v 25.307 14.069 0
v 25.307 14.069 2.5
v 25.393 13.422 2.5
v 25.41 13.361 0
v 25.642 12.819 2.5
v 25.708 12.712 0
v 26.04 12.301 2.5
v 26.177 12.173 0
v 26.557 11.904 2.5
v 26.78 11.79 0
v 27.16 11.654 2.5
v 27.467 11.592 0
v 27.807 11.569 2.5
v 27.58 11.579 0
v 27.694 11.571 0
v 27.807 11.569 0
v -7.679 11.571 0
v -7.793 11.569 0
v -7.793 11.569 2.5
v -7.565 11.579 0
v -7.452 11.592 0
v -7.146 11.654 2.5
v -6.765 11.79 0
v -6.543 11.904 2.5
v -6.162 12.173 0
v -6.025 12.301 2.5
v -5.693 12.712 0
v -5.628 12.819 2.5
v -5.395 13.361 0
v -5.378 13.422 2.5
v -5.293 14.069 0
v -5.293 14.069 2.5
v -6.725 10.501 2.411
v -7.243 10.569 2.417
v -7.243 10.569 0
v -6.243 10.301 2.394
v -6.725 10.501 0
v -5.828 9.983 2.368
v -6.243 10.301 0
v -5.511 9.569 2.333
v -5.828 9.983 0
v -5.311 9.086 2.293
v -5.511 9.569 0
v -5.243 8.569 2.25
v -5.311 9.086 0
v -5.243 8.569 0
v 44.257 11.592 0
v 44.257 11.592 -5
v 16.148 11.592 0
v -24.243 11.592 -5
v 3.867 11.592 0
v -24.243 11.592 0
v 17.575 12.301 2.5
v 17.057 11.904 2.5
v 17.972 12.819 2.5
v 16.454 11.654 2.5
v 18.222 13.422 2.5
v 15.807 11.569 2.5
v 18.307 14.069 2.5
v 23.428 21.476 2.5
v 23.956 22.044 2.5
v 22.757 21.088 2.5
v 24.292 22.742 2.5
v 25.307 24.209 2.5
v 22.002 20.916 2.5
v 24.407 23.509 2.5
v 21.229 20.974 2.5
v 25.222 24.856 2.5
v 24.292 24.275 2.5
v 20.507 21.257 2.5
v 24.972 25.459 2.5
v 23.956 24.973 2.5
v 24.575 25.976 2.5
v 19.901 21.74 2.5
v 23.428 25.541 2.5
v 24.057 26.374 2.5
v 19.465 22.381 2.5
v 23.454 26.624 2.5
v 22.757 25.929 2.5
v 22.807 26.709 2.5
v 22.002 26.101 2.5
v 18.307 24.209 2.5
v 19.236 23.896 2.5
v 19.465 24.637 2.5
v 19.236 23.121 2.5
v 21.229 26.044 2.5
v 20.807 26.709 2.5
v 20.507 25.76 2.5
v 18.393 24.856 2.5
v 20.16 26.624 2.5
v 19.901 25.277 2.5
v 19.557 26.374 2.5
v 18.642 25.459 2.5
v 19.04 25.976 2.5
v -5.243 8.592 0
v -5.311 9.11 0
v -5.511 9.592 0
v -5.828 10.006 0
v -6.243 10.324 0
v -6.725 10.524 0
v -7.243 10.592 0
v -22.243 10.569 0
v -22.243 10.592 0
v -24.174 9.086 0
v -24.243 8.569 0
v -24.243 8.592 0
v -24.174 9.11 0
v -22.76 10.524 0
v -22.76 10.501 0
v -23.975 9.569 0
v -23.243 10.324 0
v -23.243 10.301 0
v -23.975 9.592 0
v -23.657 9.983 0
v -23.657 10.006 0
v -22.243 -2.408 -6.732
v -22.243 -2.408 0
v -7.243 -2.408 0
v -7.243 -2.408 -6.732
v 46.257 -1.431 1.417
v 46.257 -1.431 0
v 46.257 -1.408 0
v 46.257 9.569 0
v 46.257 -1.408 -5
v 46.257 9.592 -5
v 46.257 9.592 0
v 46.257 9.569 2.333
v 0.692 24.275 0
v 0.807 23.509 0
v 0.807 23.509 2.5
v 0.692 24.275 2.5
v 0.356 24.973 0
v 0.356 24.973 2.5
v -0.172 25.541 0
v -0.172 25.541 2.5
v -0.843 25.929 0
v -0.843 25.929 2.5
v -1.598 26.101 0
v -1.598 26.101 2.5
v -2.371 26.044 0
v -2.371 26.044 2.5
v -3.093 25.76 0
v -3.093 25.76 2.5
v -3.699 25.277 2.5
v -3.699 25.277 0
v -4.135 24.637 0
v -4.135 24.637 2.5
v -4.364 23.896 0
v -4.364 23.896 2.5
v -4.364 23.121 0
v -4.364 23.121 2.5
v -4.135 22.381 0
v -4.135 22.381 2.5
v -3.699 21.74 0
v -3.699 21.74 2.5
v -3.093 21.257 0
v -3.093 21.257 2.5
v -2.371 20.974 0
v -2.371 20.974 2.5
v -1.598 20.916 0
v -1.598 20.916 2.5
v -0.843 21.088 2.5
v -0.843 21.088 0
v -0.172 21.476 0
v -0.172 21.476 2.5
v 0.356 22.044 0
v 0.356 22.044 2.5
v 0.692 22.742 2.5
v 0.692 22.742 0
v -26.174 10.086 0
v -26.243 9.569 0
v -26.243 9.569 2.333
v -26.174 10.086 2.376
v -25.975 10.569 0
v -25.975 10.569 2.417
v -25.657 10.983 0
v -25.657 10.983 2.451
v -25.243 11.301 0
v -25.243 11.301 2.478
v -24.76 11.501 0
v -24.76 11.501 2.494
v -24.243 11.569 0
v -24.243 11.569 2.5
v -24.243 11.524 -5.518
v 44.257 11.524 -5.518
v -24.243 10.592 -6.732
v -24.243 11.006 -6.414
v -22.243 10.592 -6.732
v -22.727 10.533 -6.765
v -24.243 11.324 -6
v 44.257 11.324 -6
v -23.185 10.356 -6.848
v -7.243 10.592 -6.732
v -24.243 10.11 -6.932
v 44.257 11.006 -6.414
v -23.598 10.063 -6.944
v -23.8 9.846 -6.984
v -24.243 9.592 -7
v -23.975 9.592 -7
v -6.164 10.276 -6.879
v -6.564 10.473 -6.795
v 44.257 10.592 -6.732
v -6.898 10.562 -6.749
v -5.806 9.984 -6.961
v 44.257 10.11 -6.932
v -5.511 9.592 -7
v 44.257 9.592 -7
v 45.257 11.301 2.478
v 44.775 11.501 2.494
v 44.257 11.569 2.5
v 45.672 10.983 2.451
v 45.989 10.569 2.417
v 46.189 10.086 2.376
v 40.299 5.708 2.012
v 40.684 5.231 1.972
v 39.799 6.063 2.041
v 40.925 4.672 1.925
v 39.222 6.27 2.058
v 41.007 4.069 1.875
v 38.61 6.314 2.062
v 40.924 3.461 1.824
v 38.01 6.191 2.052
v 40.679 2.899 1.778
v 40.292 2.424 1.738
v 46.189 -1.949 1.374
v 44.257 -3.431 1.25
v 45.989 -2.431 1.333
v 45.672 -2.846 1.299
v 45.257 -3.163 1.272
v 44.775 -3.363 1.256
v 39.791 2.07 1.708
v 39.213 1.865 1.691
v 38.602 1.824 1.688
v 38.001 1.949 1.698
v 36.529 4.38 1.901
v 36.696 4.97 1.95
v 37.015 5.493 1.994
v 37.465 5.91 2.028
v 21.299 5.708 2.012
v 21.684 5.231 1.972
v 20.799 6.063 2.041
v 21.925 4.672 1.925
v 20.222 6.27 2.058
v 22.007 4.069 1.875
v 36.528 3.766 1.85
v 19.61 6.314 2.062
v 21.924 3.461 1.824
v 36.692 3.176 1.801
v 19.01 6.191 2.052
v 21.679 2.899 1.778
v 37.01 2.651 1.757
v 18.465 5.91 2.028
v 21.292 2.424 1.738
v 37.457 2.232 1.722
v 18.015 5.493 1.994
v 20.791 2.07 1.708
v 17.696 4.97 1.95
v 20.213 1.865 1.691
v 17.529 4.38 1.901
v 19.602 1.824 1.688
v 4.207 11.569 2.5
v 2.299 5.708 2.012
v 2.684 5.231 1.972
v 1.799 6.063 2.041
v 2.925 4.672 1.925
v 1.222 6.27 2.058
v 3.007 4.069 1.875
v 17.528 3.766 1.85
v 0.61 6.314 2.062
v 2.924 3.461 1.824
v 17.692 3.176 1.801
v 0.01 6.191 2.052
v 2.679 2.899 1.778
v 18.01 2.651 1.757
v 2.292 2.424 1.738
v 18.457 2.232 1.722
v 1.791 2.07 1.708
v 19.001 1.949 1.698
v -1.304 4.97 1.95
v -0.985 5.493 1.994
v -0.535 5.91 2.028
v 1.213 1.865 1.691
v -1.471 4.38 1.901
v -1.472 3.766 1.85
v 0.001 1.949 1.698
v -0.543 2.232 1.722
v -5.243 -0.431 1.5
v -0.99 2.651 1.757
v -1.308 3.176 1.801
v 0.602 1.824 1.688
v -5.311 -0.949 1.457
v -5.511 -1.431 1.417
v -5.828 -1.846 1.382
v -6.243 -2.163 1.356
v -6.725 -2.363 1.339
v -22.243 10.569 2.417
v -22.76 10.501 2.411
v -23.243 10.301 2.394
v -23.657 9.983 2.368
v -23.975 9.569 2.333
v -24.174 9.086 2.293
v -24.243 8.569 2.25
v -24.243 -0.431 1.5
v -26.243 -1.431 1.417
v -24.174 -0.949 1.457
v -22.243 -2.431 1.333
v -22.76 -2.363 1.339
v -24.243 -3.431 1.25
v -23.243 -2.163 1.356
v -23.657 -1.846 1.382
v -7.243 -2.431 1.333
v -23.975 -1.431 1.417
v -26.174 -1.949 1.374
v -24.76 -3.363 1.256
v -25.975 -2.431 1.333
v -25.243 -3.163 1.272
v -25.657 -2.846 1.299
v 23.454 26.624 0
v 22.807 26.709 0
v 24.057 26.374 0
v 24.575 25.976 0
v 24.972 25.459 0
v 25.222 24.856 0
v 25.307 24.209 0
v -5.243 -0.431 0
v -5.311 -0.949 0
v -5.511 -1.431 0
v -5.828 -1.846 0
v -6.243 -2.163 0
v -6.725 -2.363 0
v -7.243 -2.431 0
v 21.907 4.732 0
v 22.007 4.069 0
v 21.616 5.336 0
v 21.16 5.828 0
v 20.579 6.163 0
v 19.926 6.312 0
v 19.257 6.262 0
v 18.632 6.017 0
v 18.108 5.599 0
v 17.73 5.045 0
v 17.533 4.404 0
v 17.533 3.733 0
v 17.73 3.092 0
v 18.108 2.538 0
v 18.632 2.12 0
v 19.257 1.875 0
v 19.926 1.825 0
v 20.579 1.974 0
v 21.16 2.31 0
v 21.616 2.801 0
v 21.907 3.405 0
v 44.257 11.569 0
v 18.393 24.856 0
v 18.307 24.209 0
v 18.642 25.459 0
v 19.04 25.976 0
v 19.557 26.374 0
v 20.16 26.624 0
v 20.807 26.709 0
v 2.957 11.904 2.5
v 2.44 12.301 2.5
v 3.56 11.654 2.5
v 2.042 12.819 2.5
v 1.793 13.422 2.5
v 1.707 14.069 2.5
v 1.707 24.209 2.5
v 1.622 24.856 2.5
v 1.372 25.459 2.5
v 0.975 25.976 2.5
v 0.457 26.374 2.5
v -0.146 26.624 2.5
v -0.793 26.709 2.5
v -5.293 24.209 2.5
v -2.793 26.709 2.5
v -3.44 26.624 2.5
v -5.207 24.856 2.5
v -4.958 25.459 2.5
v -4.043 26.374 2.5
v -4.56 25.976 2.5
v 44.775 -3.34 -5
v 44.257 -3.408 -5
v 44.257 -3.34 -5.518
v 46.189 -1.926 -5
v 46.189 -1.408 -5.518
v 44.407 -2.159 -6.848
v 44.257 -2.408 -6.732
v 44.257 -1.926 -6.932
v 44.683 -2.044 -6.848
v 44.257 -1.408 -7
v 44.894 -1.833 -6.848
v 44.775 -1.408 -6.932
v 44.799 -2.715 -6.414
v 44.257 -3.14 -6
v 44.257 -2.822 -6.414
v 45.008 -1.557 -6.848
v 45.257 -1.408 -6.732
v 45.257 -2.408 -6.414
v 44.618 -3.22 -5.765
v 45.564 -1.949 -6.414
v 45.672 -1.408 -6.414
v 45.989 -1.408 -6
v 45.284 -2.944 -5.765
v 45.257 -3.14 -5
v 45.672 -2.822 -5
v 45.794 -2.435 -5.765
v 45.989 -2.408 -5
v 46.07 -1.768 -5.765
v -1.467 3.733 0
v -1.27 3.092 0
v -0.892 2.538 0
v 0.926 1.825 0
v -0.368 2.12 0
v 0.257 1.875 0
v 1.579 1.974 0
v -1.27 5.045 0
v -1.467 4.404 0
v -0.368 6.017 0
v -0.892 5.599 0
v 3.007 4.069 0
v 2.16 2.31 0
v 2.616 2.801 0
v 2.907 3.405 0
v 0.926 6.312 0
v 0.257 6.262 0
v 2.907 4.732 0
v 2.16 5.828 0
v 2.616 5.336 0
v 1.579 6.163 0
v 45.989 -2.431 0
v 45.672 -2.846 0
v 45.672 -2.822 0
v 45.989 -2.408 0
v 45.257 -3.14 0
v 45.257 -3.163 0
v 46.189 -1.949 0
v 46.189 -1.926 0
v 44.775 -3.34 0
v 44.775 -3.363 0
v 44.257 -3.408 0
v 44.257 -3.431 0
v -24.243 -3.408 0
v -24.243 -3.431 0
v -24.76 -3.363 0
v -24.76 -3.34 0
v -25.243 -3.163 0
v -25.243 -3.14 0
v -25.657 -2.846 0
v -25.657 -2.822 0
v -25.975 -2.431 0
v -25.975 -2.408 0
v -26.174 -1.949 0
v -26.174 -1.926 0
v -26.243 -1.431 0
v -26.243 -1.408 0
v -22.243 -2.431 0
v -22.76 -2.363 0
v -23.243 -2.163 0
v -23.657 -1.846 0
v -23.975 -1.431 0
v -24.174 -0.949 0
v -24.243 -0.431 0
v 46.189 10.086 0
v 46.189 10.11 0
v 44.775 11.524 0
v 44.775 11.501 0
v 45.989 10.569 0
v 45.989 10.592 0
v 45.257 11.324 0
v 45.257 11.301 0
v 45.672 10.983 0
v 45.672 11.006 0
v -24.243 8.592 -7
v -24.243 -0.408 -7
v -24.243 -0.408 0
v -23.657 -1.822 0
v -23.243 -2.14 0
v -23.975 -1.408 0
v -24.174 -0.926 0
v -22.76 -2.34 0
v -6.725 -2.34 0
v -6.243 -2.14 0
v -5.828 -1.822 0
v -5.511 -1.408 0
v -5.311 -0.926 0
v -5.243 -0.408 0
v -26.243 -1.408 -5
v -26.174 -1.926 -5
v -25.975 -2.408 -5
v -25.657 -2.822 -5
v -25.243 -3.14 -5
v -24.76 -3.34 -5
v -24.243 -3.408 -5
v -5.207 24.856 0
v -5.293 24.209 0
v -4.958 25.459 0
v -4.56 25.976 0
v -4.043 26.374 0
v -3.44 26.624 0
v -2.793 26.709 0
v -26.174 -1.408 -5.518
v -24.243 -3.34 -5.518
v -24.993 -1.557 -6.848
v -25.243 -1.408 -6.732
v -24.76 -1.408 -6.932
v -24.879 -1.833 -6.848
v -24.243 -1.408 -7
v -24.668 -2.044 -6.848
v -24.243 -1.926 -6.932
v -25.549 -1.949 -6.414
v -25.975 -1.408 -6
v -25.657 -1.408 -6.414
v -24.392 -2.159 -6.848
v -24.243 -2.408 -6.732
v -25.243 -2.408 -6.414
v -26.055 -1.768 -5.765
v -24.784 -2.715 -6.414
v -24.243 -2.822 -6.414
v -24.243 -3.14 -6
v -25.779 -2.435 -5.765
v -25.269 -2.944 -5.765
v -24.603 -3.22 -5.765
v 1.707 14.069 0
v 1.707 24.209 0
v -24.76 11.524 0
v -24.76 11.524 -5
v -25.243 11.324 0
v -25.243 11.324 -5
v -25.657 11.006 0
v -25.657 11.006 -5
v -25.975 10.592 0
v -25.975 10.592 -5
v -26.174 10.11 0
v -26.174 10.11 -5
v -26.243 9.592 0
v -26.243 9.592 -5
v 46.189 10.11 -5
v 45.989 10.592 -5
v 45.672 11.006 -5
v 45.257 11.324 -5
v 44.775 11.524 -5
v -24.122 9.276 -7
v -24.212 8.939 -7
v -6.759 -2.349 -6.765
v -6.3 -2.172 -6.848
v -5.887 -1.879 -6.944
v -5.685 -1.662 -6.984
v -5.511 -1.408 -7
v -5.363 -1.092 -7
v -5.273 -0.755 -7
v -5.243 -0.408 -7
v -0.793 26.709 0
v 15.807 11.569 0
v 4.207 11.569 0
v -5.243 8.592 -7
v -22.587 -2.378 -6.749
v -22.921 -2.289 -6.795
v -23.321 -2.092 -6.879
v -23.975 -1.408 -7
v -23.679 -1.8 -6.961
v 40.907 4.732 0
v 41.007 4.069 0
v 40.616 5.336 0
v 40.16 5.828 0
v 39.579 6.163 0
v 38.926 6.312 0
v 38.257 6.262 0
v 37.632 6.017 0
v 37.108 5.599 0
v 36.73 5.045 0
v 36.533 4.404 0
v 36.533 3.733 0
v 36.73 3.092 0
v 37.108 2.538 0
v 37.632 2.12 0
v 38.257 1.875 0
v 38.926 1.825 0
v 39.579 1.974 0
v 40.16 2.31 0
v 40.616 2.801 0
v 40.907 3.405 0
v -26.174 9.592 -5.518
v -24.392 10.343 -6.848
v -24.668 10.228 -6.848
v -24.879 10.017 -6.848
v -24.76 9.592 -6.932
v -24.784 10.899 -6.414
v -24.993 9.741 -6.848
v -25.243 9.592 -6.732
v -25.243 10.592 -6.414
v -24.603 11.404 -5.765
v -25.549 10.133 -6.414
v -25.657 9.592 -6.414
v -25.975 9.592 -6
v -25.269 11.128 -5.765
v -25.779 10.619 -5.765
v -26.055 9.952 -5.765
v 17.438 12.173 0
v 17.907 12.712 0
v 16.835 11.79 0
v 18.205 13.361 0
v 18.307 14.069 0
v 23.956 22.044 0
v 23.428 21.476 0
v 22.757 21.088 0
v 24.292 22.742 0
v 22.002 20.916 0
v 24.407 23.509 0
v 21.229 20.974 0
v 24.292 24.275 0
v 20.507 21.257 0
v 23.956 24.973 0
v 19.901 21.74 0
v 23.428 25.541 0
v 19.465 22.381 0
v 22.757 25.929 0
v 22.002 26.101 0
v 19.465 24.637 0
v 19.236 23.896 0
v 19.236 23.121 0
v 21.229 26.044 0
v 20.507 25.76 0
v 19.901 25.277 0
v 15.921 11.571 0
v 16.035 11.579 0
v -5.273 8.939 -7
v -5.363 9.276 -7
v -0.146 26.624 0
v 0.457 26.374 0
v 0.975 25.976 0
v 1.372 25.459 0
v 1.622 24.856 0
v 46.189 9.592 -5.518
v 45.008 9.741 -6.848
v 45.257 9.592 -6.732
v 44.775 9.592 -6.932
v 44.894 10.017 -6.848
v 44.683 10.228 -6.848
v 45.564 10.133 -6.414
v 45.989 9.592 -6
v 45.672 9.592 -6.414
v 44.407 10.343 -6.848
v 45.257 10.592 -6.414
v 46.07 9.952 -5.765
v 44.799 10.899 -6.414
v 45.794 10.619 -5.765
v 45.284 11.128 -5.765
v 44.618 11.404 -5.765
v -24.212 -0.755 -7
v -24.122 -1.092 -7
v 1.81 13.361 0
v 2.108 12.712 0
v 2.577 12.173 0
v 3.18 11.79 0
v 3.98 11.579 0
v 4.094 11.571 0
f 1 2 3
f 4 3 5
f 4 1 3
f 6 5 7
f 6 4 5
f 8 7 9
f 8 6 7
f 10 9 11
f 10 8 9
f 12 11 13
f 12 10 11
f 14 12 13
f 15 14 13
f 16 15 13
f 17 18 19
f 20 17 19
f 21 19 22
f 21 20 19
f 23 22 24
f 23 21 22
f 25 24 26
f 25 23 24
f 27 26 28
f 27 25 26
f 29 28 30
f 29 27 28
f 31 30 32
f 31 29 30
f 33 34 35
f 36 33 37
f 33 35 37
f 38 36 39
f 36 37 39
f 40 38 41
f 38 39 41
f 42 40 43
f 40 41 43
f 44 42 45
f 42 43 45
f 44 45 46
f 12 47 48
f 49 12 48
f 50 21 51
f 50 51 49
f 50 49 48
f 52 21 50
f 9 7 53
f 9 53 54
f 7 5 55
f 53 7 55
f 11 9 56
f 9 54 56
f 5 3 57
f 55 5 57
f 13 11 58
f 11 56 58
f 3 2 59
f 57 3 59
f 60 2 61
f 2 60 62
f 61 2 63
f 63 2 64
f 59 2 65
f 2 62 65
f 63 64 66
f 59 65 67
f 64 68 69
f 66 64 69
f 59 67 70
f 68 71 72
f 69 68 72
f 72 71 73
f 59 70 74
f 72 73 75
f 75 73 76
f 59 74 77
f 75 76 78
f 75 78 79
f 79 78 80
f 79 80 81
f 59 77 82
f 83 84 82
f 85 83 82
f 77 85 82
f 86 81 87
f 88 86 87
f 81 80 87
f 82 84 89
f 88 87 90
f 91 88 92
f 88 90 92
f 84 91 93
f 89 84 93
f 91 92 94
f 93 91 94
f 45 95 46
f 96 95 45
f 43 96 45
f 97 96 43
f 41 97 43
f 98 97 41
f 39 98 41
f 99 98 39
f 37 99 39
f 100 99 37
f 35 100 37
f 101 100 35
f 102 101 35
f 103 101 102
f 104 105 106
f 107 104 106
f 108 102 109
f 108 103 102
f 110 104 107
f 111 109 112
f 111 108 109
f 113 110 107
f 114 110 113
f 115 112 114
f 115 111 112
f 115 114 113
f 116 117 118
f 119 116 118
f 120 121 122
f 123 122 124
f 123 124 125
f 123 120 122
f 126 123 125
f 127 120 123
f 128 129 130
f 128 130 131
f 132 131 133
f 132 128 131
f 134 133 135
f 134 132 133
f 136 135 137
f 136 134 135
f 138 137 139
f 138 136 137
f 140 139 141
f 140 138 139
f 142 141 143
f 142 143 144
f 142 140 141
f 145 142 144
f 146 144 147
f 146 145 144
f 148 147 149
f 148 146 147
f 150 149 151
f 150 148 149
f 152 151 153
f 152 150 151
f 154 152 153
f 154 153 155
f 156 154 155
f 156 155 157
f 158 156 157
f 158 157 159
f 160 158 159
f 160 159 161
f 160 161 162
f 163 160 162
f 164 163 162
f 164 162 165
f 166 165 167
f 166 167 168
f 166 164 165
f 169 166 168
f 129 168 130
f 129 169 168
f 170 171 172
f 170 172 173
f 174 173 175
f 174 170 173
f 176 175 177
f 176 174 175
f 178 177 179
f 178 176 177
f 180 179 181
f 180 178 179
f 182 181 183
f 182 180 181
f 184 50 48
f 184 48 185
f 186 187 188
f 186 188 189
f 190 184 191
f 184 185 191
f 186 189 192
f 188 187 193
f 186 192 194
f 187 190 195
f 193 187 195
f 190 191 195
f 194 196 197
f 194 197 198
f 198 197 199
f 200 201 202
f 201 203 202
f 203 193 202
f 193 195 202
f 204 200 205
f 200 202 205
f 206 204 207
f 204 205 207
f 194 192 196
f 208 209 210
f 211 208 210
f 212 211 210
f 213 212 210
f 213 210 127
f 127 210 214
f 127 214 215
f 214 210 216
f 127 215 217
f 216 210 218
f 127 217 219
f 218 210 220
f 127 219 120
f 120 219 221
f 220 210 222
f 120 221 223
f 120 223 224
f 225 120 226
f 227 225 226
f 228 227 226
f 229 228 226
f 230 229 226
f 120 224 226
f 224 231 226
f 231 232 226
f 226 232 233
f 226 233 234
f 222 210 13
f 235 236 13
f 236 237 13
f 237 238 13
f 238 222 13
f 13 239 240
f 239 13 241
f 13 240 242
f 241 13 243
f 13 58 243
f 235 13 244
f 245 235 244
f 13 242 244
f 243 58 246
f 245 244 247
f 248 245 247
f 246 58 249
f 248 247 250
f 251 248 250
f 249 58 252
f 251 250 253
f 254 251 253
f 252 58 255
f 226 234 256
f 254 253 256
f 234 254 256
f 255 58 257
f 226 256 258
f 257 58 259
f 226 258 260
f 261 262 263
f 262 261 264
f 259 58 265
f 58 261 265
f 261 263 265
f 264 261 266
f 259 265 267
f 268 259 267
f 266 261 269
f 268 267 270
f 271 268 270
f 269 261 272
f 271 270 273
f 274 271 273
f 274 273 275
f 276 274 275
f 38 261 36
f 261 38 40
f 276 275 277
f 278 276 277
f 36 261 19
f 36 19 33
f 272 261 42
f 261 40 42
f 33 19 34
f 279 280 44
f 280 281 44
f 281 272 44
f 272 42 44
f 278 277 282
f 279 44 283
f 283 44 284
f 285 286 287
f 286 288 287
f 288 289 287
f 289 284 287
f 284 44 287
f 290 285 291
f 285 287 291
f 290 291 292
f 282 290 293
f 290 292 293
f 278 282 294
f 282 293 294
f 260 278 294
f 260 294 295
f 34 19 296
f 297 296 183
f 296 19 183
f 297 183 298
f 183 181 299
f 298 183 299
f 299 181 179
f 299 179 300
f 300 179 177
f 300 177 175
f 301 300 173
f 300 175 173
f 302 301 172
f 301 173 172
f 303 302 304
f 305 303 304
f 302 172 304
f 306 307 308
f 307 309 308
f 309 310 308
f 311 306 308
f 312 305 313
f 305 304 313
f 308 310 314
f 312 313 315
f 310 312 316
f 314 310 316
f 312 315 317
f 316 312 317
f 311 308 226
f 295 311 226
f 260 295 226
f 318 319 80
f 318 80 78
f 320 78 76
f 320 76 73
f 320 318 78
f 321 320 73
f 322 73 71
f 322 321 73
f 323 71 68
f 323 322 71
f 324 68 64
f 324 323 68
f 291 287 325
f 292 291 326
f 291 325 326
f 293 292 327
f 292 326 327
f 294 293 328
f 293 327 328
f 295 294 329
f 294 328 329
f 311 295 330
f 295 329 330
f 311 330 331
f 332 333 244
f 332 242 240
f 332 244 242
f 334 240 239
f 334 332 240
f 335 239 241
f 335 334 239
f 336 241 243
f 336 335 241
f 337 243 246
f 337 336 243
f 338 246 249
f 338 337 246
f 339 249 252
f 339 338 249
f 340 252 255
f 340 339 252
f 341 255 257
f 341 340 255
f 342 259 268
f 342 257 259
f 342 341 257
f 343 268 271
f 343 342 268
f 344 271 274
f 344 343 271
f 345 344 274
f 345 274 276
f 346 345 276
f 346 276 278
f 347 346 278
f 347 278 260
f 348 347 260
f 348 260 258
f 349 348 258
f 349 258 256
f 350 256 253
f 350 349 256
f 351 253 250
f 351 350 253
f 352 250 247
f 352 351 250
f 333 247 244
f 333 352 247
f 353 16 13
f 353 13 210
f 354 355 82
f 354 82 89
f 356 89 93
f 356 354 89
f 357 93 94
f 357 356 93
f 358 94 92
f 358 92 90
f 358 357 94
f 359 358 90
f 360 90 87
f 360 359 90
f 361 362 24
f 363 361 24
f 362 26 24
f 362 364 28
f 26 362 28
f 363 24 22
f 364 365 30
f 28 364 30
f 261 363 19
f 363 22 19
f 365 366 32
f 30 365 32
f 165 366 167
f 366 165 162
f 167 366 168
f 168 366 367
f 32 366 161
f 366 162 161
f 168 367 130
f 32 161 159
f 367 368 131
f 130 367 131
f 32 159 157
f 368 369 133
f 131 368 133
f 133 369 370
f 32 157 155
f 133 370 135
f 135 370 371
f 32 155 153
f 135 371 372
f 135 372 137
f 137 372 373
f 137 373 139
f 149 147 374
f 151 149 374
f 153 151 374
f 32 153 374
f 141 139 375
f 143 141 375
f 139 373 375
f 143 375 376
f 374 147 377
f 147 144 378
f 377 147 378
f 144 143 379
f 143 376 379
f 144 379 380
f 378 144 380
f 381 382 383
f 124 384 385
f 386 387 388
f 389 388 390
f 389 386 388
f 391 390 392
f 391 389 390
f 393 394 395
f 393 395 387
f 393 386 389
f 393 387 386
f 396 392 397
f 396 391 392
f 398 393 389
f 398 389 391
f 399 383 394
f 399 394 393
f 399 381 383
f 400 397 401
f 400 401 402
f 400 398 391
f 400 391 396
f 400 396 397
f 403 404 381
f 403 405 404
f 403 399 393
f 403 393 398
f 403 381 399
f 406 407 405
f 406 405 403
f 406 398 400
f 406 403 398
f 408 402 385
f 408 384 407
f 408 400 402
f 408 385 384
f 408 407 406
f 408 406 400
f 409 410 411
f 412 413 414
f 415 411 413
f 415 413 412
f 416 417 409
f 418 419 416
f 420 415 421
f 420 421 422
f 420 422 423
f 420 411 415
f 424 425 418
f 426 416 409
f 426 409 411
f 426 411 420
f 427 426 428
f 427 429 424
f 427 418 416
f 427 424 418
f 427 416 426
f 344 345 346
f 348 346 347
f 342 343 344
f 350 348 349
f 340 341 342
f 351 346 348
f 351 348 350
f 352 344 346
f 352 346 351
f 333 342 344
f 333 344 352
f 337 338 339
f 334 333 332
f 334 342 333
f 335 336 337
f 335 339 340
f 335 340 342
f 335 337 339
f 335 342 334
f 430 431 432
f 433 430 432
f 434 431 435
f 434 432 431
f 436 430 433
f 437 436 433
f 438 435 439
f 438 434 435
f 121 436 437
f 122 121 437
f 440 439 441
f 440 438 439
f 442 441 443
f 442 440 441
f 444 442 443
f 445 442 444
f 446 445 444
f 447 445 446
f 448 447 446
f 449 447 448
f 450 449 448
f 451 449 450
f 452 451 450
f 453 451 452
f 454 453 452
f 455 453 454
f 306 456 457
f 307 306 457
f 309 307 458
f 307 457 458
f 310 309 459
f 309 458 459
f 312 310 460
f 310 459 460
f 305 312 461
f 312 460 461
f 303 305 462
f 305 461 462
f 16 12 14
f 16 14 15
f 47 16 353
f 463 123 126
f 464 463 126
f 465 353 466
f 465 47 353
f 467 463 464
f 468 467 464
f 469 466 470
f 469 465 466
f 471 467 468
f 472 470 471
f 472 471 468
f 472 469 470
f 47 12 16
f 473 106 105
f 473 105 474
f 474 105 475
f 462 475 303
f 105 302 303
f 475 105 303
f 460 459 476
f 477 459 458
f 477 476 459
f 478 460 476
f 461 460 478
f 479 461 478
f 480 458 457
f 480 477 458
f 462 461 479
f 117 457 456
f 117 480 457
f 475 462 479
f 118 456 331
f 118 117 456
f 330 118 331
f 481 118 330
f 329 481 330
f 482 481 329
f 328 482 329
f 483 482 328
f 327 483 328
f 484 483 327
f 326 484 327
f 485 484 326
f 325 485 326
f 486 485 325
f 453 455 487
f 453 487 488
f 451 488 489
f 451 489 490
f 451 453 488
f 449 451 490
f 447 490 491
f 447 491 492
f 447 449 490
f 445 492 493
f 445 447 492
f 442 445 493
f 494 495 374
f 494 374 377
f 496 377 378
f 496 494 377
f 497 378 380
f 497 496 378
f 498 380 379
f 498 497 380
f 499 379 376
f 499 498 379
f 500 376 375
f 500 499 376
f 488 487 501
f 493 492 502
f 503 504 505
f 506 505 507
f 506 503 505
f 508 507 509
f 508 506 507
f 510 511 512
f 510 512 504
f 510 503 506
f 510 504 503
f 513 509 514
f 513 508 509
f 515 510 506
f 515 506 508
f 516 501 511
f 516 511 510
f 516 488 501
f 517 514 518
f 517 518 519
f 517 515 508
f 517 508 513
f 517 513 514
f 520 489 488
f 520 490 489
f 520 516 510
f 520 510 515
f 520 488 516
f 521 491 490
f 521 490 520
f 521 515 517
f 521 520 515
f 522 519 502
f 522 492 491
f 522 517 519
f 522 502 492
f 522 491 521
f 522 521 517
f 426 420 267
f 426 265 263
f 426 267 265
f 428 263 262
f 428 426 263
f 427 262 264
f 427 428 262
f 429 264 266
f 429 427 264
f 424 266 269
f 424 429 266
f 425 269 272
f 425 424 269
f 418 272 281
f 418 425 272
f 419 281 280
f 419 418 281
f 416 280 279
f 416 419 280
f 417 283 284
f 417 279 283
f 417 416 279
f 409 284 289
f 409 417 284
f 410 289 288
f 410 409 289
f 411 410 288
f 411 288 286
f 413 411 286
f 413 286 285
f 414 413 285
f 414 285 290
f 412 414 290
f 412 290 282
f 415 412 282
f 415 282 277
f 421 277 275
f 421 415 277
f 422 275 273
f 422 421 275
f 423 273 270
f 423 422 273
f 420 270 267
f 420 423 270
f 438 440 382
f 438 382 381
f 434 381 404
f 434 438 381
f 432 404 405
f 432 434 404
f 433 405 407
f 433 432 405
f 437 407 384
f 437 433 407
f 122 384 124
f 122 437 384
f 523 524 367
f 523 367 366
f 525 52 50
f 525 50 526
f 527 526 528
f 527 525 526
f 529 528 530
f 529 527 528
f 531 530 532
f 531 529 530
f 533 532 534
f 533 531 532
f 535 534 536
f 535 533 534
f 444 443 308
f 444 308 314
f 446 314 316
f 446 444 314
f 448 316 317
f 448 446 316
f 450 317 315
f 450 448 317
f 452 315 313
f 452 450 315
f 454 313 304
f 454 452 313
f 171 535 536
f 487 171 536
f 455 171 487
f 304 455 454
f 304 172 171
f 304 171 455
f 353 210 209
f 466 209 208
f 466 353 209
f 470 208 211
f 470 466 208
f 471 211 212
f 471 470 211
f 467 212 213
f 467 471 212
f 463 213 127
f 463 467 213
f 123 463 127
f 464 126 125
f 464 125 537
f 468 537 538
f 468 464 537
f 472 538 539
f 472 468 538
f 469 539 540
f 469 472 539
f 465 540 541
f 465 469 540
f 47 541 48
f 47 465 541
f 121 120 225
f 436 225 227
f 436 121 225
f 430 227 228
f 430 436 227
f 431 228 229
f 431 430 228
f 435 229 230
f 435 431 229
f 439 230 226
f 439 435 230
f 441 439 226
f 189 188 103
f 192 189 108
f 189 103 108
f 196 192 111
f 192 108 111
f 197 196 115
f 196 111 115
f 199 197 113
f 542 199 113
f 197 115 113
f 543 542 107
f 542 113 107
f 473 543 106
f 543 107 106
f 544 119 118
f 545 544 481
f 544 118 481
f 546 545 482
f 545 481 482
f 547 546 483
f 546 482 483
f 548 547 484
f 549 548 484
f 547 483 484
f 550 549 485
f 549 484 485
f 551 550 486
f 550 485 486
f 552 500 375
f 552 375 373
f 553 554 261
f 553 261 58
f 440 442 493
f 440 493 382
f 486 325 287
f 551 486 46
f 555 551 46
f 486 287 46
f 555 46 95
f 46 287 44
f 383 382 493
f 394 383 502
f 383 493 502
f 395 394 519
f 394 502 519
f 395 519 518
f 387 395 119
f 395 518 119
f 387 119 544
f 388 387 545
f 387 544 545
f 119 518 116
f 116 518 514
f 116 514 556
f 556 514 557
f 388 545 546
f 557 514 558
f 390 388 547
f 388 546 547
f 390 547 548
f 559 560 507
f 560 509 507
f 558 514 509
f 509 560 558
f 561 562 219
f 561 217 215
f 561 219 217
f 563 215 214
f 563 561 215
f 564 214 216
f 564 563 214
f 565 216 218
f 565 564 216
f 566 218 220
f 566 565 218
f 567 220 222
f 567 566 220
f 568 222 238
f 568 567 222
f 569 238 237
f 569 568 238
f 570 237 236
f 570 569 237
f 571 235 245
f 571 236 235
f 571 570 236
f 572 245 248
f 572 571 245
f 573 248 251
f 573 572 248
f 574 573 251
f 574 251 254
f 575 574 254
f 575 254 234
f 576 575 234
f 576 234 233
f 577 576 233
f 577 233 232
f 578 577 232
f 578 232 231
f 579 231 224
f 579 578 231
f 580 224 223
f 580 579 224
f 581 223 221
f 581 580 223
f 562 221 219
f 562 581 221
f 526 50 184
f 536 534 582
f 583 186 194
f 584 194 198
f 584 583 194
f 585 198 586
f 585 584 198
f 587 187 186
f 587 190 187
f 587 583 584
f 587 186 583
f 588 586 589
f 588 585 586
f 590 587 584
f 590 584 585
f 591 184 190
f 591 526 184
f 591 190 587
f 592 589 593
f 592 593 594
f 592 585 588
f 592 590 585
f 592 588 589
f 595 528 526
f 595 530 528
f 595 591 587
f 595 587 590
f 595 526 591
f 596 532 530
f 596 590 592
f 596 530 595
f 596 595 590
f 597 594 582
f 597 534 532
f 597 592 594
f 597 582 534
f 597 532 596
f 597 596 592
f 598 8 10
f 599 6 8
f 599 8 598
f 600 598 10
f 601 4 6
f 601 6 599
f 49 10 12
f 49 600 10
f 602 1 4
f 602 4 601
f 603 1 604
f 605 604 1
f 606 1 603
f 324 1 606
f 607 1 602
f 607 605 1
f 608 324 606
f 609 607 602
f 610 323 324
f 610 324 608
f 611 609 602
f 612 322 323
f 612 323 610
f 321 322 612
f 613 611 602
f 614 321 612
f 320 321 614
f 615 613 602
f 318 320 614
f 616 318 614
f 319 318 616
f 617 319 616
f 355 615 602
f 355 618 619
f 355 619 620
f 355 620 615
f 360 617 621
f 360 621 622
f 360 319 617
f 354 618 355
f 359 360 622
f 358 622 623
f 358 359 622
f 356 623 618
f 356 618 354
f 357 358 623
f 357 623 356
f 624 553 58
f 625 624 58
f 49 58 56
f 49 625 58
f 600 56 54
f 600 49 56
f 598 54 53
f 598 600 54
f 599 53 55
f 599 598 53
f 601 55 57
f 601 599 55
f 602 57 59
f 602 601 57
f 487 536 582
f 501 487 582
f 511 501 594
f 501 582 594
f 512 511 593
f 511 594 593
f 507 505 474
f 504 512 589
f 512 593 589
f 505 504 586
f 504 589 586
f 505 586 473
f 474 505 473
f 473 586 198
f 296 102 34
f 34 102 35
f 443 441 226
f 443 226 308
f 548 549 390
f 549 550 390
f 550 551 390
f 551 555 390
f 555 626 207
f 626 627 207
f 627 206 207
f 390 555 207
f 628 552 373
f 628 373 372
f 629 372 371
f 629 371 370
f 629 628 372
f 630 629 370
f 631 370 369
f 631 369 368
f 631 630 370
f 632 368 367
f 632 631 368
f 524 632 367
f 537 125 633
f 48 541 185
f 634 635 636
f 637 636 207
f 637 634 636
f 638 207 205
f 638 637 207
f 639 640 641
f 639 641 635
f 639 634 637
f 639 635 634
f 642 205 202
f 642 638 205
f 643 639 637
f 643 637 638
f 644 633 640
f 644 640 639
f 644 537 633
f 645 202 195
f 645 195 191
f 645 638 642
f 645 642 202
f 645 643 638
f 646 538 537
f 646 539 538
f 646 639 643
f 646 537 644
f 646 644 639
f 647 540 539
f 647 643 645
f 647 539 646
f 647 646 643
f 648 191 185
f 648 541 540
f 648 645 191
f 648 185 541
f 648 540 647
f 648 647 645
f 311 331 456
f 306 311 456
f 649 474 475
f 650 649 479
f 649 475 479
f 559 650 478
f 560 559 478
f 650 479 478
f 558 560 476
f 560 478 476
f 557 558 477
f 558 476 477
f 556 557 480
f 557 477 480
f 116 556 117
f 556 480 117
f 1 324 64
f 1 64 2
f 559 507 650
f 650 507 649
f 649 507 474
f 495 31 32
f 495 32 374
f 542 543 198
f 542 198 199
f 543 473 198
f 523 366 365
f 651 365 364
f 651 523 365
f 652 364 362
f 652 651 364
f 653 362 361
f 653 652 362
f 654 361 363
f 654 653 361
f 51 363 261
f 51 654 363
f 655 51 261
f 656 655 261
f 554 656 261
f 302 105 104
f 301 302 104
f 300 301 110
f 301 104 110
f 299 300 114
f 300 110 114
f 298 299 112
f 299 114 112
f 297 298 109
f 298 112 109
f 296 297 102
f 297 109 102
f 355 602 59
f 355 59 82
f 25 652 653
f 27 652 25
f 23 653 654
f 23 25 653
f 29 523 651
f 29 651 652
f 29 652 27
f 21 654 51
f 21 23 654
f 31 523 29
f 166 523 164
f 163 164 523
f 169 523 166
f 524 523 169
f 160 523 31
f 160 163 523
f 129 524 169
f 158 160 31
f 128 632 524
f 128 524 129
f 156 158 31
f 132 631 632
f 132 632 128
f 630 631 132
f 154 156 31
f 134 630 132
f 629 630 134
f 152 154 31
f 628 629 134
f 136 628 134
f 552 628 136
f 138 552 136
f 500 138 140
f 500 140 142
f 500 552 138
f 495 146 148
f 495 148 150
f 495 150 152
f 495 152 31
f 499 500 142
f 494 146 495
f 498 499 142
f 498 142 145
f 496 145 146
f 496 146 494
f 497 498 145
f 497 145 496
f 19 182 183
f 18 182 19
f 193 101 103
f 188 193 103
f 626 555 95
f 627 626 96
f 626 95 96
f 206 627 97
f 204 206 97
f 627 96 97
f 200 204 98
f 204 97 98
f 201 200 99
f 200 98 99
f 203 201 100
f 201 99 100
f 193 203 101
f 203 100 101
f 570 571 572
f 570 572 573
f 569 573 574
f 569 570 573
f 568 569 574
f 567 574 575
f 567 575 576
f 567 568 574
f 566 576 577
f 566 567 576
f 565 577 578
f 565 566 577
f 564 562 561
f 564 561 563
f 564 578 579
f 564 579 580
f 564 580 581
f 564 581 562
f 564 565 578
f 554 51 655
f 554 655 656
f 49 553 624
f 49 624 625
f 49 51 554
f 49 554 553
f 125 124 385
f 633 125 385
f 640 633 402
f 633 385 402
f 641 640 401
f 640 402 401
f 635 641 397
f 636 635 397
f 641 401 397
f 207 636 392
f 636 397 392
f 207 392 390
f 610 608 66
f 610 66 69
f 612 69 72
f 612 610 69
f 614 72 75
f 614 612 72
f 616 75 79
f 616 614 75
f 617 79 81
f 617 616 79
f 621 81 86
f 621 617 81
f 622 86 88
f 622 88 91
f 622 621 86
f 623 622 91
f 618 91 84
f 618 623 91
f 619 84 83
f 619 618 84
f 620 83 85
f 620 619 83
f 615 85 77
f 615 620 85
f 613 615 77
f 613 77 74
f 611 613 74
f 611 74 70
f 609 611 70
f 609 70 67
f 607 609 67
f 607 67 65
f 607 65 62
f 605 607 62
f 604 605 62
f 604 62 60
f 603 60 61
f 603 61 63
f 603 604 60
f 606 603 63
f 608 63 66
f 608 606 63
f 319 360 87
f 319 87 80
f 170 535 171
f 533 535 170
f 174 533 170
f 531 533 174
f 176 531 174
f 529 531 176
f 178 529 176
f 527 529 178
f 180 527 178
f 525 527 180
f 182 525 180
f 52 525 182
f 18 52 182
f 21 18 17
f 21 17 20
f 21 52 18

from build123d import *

# Parameters (mm, degrees)
SKETCH1_R           = 2.250000000000002
SKETCH1_R_2         = 2.249999999999999
SKETCH1_R_3         = 2.6000000000000005
SKETCH1_R_4         = 2.600000000000003
BOSS_EXTRUDE1_DEPTH = 2.5
BOSS_EXTRUDE2_DEPTH = 7
CUT_EXTRUDE1_DEPTH  = 78.57966290553851
FILLET1_R           = 2


with BuildPart() as part:
    # Sketch1 → Boss-Extrude1 (new body)
    with BuildSketch(Plane.XY):
        with BuildLine():
            Line((-24.24262981574538, 11.568676716917917), (-7.792629815745428, 11.568676716917919))
            ThreePointArc((-7.792629815745428, 11.568676716917919), (-6.024862862779042, 12.30090976395155), (-5.292629815745411, 14.068676716917937))
            Line((-5.292629815745411, 14.068676716917937), (-5.2926298157454115, 24.208689532378564))
            ThreePointArc((-5.2926298157454115, 24.208689532378564), (-4.5603967687117795, 25.976456485344933), (-2.7926298157454106, 26.70868953237856))
            Line((-2.7926298157454106, 26.70868953237856), (-0.7926298157454105, 26.70868953237856))
            ThreePointArc((-0.7926298157454105, 26.70868953237856), (0.975137137220956, 25.97645648534493), (1.7073701842545899, 24.208689532378564))
            Line((1.7073701842545899, 24.208689532378564), (1.707370184254591, 14.068676716917937))
            ThreePointArc((1.707370184254591, 14.068676716917937), (2.439603231288222, 12.30090976395155), (4.207370184254609, 11.568676716917919))
            Line((4.207370184254609, 11.568676716917919), (15.807370184254571, 11.568676716917919))
            ThreePointArc((15.807370184254571, 11.568676716917919), (17.575137137220956, 12.300909763951552), (18.307370184254587, 14.068676716917935))
            Line((18.307370184254587, 14.068676716917935), (18.30737018425459, 24.208689532378564))
            ThreePointArc((18.30737018425459, 24.208689532378564), (19.039603231288222, 25.976456485344933), (20.80737018425459, 26.708689532378564))
            Line((20.80737018425459, 26.708689532378564), (22.80737018425459, 26.708689532378568))
            ThreePointArc((22.80737018425459, 26.708689532378568), (24.575137137220963, 25.976456485344936), (25.307370184254594, 24.208689532378564))
            Line((25.307370184254594, 24.208689532378564), (25.307370184254594, 14.068676716917937))
            ThreePointArc((25.307370184254594, 14.068676716917937), (26.039603231288226, 12.300909763951552), (27.80737018425461, 11.568676716917919))
            Line((27.80737018425461, 11.568676716917919), (44.25737018425458, 11.568676716917917))
            ThreePointArc((44.25737018425458, 11.568676716917917), (45.67158374662769, 10.982890279291011), (46.2573701842546, 9.568676716917901))
            Line((46.2573701842546, 9.568676716917901), (46.25737018425459, -1.4313232830820677))
            ThreePointArc((46.25737018425459, -1.4313232830820677), (45.67158374662768, -2.845536845455177), (44.257370184254576, -3.431323283082082))
            Line((44.257370184254576, -3.431323283082082), (-24.242629815745374, -3.431323283082082))
            ThreePointArc((-24.242629815745374, -3.431323283082082), (-25.656843378118484, -2.8455368454551784), (-26.242629815745392, -1.4313232830820677))
            Line((-26.242629815745392, -1.4313232830820677), (-26.2426298157454, 9.568676716917903))
            ThreePointArc((-26.2426298157454, 9.568676716917903), (-25.65684337811849, 10.982890279291013), (-24.24262981574538, 11.568676716917917))
        make_face()
        with Locations((38.7573701842546, 4.068676716917918)):
            Circle(SKETCH1_R, mode=Mode.SUBTRACT)
        with Locations((19.757370184254597, 4.068676716917918)):
            Circle(SKETCH1_R_2, mode=Mode.SUBTRACT)
        with Locations((0.7573701842545979, 4.068676716917918)):
            Circle(SKETCH1_R_2, mode=Mode.SUBTRACT)
        with Locations((-1.7926298157454108, 23.50868953237856)):
            Circle(SKETCH1_R_3, mode=Mode.SUBTRACT)
        with Locations((21.80737018425459, 23.508689532378565)):
            Circle(SKETCH1_R_4, mode=Mode.SUBTRACT)
        with BuildLine():
            Line((-22.24262981574538, 10.568676716917917), (-7.242629815745397, 10.56867671691792))
            ThreePointArc((-7.242629815745397, 10.56867671691792), (-5.8284162533723025, 9.982890279291016), (-5.2426298157453965, 8.56867671691792))
            Line((-5.2426298157453965, 8.56867671691792), (-5.242629815745396, -0.43132328308208134))
            ThreePointArc((-5.242629815745396, -0.43132328308208134), (-5.828416253372301, -1.8455368454551766), (-7.242629815745396, -2.4313232830820817))
            Line((-7.242629815745396, -2.4313232830820817), (-22.24262981574538, -2.431323283082082))
            ThreePointArc((-22.24262981574538, -2.431323283082082), (-23.65684337811849, -1.8455368454551762), (-24.242629815745396, -0.43132328308206774))
            Line((-24.242629815745396, -0.43132328308206774), (-24.242629815745396, 8.568676716917903))
            ThreePointArc((-24.242629815745396, 8.568676716917903), (-23.65684337811849, 9.982890279291013), (-22.24262981574538, 10.568676716917917))
        make_face(mode=Mode.SUBTRACT)
    extrude(amount=BOSS_EXTRUDE1_DEPTH)

    # Sketch2 → Boss-Extrude2 (add)
    with BuildSketch(Plane(origin=(0, 0, 0), x_dir=(-1, 0, 0), z_dir=(0, 0, -1))):
        with BuildLine():
            Line((-44.2573701842546, 11.591990827848472), (24.242629815745396, 11.591990827848472))
            ThreePointArc((24.242629815745396, 11.591990827848472), (25.65684337811849, 11.006204390221566), (26.2426298157454, 9.591990827848472))
            Line((26.2426298157454, 9.591990827848472), (26.2426298157454, -1.408009172151513))
            ThreePointArc((26.2426298157454, -1.408009172151513), (25.65684337811849, -2.8222227345246234), (24.24262981574538, -3.4080091721515275))
            Line((24.24262981574538, -3.4080091721515275), (-44.25737018425458, -3.4080091721515275))
            ThreePointArc((-44.25737018425458, -3.4080091721515275), (-45.67158374662769, -2.8222227345246225), (-46.2573701842546, -1.4080091721515136))
            Line((-46.2573701842546, -1.4080091721515136), (-46.2573701842546, 9.591990827848472))
            ThreePointArc((-46.2573701842546, 9.591990827848472), (-45.67158374662769, 11.006204390221567), (-44.2573701842546, 11.591990827848472))
        make_face()
        with BuildLine():
            Line((7.242629815745404, 10.591990827848473), (22.242629815745403, 10.591990827848472))
            ThreePointArc((22.242629815745403, 10.591990827848472), (23.6568433781185, 10.006204390221566), (24.242629815745403, 8.591990827848472))
            Line((24.242629815745403, 8.591990827848472), (24.242629815745403, -0.4080091721515276))
            ThreePointArc((24.242629815745403, -0.4080091721515276), (23.6568433781185, -1.8222227345246227), (22.242629815745403, -2.408009172151528))
            Line((22.242629815745403, -2.408009172151528), (7.2426298157454045, -2.4080091721515275))
            ThreePointArc((7.2426298157454045, -2.4080091721515275), (5.8284162533723105, -1.8222227345246227), (5.242629815745405, -0.40800917215152854))
            Line((5.242629815745405, -0.40800917215152854), (5.242629815745403, 8.591990827848472))
            ThreePointArc((5.242629815745403, 8.591990827848472), (5.828416253372307, 10.006204390221567), (7.242629815745404, 10.591990827848473))
        make_face(mode=Mode.SUBTRACT)
    extrude(amount=BOSS_EXTRUDE2_DEPTH)

    # Sketch3 → Cut-Extrude1 (cut, through all)
    with BuildSketch(Plane.ZY.offset(26.242629815745392)):
        Polygon((2.5, 11.568676716917924), (1.25, -3.4313232830820675), (2.5, -3.431323283082067), align=None)
    extrude(amount=-CUT_EXTRUDE1_DEPTH, mode=Mode.SUBTRACT)

    # Fillet1
    # the kernel refuses this fillet: 2 mm, written as the material it takes off along each edge
    with BuildSketch(Plane(origin=(-24.24262981574539, 9.591990827848464, -7), x_dir=(-3.55e-15, 1, 0), z_dir=(1, 3.55e-15, 0))) as fillet1_piece_1:
        with BuildLine():
            CenterArc((2.000000000000009 - FILLET1_R, FILLET1_R), FILLET1_R, 270, 90)
            Line((2.000000000000009 - FILLET1_R, 0), (2.000000000000009, 0))
            Line((2.000000000000009, 0), (2.000000000000009, FILLET1_R))
        make_face()
    revolve(axis=Axis((-24.24262981574539, 9.591990827848464, -7), (0, 0, 1)), revolution_arc=89.99999999999959, mode=Mode.SUBTRACT)
    with BuildSketch(Plane(origin=(-26.2426298157454, 9.591990827848472, -7), x_dir=(0, 0, 1), z_dir=(0, -1, 0))) as fillet1_piece_2:
        with BuildLine():
            CenterArc((FILLET1_R, -FILLET1_R), FILLET1_R, 90, 89.99999999999989)
            Line((0, -FILLET1_R), (0, 0))
            Line((0, 0), (FILLET1_R, 0))
        make_face()
    extrude(amount=10.999999999999984, mode=Mode.SUBTRACT)
    with BuildSketch(Plane(origin=(-24.242629815745396, -1.4080091721515238, -7), x_dir=(-1, 5.33e-15, 0), z_dir=(5.33e-15, 1, 0))) as fillet1_piece_3:
        with BuildLine():
            CenterArc((2.0000000000000036 - FILLET1_R, FILLET1_R), FILLET1_R, 270.0000000000001, 89.99999999999989)
            Line((2.0000000000000036 - FILLET1_R, 0), (2.0000000000000036, 0))
            Line((2.0000000000000036, 0), (2.0000000000000036, FILLET1_R))
        make_face()
    revolve(axis=Axis((-24.242629815745396, -1.4080091721515238, -7), (0, 0, 1)), revolution_arc=90.00000000000071, mode=Mode.SUBTRACT)
    with BuildSketch(Plane(origin=(-24.24262981574538, -3.4080091721515275, -7), x_dir=(0, 1, 0), z_dir=(1, 0, 0))) as fillet1_piece_4:
        with BuildLine():
            CenterArc((FILLET1_R, FILLET1_R), FILLET1_R, 180, 90)
            Line((0, FILLET1_R), (0, 0))
            Line((0, 0), (FILLET1_R, 0))
        make_face()
    extrude(amount=68.49999999999997, mode=Mode.SUBTRACT)
    with BuildSketch(Plane(origin=(44.25737018425459, -1.408009172151522, -7), x_dir=(-3.55e-15, -1, 0), z_dir=(-1, 3.55e-15, 0))) as fillet1_piece_5:
        with BuildLine():
            CenterArc((2.000000000000006 - FILLET1_R, FILLET1_R), FILLET1_R, 270, 90)
            Line((2.000000000000006, FILLET1_R), (2.000000000000006, 0))
            Line((2.000000000000006, 0), (2.000000000000006 - FILLET1_R, 0))
        make_face()
    revolve(axis=Axis((44.25737018425459, -1.408009172151522, -7), (0, 0, 1)), revolution_arc=90.00000000000044, mode=Mode.SUBTRACT)
    with BuildSketch(Plane(origin=(46.2573701842546, -1.4080091721515136, -7), x_dir=(-3.55e-15, 0, 1), z_dir=(0, 1, 0))) as fillet1_piece_6:
        with BuildLine():
            CenterArc((FILLET1_R, -FILLET1_R), FILLET1_R, 90.0000000000002, 89.9999999999998)
            Line((7.11e-15, -FILLET1_R), (0, 0))
            Line((0, 0), (FILLET1_R, 0))
        make_face()
    extrude(amount=10.999999999999986, mode=Mode.SUBTRACT)
    with BuildSketch(Plane(origin=(44.2573701842546, 9.591990827848468, -7), x_dir=(1, 1.78e-15, 0), z_dir=(1.78e-15, -1, 0))) as fillet1_piece_7:
        with BuildLine():
            CenterArc((2 - FILLET1_R, FILLET1_R), FILLET1_R, 270, 90)
            Line((2, FILLET1_R), (2, 0))
            Line((2, 0), (2 - FILLET1_R, 0))
        make_face()
    revolve(axis=Axis((44.2573701842546, 9.591990827848468, -7), (0, 0, 1)), revolution_arc=89.9999999999999, mode=Mode.SUBTRACT)
    with BuildSketch(Plane(origin=(44.2573701842546, 11.591990827848472, -7), x_dir=(0, 0, 1), z_dir=(-1, 0, 0))) as fillet1_piece_8:
        with BuildLine():
            CenterArc((FILLET1_R, -FILLET1_R), FILLET1_R, 90, 90)
            Line((0, -FILLET1_R), (0, 0))
            Line((0, 0), (FILLET1_R, 0))
        make_face()
    extrude(amount=68.5, mode=Mode.SUBTRACT)


solid = part.part
